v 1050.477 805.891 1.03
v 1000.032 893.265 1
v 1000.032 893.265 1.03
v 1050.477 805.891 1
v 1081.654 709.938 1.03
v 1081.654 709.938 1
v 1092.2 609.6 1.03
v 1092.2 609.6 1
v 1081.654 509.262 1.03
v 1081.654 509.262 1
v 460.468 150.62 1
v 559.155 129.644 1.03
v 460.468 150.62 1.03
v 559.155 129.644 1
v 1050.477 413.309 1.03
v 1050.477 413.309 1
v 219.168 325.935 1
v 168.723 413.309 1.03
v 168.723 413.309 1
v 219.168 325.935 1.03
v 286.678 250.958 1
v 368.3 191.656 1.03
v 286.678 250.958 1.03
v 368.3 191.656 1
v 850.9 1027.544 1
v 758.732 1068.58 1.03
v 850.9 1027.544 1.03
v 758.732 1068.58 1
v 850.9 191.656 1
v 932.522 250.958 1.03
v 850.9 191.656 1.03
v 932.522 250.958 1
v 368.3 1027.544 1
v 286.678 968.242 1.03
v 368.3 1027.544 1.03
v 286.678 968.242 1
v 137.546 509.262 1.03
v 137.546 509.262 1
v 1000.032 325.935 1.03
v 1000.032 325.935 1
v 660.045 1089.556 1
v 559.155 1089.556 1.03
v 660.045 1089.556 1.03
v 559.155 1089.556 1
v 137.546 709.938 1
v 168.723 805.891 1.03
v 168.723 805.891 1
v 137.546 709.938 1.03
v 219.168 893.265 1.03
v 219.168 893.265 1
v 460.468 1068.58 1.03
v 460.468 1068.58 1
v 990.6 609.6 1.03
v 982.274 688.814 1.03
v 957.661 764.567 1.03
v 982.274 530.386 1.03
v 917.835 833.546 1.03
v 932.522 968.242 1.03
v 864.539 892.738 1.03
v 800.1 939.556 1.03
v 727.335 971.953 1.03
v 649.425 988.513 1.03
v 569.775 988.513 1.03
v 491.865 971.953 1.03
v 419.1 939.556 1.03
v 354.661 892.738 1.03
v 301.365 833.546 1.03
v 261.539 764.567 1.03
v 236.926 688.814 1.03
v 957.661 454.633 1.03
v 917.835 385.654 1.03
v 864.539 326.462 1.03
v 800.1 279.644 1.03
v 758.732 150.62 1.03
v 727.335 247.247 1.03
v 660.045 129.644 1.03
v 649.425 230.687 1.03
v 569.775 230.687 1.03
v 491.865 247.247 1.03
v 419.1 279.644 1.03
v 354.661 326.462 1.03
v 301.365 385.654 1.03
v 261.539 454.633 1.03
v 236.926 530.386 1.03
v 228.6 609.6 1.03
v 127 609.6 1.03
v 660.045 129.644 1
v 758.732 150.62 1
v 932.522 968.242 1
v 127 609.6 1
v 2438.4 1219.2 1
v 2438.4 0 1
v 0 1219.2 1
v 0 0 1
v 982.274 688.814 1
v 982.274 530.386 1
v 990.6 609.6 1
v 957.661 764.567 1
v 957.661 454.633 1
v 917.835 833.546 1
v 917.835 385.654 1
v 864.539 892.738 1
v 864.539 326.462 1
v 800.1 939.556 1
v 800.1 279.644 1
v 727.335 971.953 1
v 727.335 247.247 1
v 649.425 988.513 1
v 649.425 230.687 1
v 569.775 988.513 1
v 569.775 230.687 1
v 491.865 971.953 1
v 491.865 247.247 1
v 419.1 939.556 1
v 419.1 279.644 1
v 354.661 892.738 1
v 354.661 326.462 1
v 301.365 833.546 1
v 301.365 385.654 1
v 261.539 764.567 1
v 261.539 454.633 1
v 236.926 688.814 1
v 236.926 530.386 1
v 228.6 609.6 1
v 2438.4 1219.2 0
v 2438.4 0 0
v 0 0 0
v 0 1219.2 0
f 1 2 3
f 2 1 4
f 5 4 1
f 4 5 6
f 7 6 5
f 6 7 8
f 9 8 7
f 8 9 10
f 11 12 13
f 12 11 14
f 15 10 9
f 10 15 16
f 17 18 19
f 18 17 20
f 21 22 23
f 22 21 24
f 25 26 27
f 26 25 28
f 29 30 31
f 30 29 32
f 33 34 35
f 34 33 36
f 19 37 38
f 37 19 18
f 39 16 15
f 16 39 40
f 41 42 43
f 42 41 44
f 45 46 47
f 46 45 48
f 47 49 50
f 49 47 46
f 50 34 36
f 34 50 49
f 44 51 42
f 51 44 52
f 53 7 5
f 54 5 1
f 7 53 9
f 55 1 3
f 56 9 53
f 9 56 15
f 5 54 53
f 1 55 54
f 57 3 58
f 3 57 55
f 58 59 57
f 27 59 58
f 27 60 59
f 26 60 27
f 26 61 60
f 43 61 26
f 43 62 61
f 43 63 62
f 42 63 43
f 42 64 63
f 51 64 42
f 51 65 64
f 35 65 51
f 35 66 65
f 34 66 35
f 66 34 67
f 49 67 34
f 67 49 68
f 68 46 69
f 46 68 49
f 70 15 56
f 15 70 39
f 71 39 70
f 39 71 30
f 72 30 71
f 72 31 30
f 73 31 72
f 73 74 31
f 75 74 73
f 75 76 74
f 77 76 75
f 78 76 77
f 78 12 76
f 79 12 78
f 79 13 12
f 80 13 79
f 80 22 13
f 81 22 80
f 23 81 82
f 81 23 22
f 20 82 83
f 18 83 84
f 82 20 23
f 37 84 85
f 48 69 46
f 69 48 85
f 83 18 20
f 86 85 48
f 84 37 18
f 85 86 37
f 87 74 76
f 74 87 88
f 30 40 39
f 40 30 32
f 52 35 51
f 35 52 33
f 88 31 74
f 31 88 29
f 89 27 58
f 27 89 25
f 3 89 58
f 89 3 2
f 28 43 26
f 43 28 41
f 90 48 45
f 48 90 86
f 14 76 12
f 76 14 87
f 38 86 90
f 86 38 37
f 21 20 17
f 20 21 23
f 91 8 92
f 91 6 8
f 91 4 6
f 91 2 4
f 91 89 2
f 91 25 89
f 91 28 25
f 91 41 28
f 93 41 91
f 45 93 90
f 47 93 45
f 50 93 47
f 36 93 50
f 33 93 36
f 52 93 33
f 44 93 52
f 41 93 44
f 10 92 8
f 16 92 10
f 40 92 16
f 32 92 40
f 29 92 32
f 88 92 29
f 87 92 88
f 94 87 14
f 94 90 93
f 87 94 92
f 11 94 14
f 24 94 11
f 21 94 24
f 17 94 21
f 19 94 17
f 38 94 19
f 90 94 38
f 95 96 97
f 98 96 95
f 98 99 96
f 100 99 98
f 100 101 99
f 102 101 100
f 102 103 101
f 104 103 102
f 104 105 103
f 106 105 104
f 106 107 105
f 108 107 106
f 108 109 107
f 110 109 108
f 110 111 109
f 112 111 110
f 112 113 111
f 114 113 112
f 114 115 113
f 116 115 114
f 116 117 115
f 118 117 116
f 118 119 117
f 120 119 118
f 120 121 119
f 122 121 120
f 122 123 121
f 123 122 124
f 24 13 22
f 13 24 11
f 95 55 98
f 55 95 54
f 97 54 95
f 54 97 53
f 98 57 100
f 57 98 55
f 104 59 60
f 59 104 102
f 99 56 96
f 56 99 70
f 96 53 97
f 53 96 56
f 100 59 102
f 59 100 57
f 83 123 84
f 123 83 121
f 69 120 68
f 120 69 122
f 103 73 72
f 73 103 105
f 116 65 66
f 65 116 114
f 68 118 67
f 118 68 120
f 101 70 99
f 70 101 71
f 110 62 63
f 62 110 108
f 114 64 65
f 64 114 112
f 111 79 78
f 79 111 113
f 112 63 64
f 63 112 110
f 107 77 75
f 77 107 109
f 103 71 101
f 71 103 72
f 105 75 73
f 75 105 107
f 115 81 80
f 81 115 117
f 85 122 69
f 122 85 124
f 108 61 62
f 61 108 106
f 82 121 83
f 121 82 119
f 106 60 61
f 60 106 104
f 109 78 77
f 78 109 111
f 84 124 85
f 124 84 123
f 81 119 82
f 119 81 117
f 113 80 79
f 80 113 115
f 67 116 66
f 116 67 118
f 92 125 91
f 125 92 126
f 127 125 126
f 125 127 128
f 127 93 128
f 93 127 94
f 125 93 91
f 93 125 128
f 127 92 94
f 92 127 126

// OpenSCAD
$inch = 25.4;
$foot = $inch * 12;

color("white")  cube([8*$foot, 4*$foot, 1]);

translate([2*$foot,2*$foot,1]) {
    difference() {
        color("black") cylinder(r=19*$inch, h=0.03);
        translate([0,0,-0.01]) {
            cylinder(r=15*$inch, h=0.1);
        }
    }
}
